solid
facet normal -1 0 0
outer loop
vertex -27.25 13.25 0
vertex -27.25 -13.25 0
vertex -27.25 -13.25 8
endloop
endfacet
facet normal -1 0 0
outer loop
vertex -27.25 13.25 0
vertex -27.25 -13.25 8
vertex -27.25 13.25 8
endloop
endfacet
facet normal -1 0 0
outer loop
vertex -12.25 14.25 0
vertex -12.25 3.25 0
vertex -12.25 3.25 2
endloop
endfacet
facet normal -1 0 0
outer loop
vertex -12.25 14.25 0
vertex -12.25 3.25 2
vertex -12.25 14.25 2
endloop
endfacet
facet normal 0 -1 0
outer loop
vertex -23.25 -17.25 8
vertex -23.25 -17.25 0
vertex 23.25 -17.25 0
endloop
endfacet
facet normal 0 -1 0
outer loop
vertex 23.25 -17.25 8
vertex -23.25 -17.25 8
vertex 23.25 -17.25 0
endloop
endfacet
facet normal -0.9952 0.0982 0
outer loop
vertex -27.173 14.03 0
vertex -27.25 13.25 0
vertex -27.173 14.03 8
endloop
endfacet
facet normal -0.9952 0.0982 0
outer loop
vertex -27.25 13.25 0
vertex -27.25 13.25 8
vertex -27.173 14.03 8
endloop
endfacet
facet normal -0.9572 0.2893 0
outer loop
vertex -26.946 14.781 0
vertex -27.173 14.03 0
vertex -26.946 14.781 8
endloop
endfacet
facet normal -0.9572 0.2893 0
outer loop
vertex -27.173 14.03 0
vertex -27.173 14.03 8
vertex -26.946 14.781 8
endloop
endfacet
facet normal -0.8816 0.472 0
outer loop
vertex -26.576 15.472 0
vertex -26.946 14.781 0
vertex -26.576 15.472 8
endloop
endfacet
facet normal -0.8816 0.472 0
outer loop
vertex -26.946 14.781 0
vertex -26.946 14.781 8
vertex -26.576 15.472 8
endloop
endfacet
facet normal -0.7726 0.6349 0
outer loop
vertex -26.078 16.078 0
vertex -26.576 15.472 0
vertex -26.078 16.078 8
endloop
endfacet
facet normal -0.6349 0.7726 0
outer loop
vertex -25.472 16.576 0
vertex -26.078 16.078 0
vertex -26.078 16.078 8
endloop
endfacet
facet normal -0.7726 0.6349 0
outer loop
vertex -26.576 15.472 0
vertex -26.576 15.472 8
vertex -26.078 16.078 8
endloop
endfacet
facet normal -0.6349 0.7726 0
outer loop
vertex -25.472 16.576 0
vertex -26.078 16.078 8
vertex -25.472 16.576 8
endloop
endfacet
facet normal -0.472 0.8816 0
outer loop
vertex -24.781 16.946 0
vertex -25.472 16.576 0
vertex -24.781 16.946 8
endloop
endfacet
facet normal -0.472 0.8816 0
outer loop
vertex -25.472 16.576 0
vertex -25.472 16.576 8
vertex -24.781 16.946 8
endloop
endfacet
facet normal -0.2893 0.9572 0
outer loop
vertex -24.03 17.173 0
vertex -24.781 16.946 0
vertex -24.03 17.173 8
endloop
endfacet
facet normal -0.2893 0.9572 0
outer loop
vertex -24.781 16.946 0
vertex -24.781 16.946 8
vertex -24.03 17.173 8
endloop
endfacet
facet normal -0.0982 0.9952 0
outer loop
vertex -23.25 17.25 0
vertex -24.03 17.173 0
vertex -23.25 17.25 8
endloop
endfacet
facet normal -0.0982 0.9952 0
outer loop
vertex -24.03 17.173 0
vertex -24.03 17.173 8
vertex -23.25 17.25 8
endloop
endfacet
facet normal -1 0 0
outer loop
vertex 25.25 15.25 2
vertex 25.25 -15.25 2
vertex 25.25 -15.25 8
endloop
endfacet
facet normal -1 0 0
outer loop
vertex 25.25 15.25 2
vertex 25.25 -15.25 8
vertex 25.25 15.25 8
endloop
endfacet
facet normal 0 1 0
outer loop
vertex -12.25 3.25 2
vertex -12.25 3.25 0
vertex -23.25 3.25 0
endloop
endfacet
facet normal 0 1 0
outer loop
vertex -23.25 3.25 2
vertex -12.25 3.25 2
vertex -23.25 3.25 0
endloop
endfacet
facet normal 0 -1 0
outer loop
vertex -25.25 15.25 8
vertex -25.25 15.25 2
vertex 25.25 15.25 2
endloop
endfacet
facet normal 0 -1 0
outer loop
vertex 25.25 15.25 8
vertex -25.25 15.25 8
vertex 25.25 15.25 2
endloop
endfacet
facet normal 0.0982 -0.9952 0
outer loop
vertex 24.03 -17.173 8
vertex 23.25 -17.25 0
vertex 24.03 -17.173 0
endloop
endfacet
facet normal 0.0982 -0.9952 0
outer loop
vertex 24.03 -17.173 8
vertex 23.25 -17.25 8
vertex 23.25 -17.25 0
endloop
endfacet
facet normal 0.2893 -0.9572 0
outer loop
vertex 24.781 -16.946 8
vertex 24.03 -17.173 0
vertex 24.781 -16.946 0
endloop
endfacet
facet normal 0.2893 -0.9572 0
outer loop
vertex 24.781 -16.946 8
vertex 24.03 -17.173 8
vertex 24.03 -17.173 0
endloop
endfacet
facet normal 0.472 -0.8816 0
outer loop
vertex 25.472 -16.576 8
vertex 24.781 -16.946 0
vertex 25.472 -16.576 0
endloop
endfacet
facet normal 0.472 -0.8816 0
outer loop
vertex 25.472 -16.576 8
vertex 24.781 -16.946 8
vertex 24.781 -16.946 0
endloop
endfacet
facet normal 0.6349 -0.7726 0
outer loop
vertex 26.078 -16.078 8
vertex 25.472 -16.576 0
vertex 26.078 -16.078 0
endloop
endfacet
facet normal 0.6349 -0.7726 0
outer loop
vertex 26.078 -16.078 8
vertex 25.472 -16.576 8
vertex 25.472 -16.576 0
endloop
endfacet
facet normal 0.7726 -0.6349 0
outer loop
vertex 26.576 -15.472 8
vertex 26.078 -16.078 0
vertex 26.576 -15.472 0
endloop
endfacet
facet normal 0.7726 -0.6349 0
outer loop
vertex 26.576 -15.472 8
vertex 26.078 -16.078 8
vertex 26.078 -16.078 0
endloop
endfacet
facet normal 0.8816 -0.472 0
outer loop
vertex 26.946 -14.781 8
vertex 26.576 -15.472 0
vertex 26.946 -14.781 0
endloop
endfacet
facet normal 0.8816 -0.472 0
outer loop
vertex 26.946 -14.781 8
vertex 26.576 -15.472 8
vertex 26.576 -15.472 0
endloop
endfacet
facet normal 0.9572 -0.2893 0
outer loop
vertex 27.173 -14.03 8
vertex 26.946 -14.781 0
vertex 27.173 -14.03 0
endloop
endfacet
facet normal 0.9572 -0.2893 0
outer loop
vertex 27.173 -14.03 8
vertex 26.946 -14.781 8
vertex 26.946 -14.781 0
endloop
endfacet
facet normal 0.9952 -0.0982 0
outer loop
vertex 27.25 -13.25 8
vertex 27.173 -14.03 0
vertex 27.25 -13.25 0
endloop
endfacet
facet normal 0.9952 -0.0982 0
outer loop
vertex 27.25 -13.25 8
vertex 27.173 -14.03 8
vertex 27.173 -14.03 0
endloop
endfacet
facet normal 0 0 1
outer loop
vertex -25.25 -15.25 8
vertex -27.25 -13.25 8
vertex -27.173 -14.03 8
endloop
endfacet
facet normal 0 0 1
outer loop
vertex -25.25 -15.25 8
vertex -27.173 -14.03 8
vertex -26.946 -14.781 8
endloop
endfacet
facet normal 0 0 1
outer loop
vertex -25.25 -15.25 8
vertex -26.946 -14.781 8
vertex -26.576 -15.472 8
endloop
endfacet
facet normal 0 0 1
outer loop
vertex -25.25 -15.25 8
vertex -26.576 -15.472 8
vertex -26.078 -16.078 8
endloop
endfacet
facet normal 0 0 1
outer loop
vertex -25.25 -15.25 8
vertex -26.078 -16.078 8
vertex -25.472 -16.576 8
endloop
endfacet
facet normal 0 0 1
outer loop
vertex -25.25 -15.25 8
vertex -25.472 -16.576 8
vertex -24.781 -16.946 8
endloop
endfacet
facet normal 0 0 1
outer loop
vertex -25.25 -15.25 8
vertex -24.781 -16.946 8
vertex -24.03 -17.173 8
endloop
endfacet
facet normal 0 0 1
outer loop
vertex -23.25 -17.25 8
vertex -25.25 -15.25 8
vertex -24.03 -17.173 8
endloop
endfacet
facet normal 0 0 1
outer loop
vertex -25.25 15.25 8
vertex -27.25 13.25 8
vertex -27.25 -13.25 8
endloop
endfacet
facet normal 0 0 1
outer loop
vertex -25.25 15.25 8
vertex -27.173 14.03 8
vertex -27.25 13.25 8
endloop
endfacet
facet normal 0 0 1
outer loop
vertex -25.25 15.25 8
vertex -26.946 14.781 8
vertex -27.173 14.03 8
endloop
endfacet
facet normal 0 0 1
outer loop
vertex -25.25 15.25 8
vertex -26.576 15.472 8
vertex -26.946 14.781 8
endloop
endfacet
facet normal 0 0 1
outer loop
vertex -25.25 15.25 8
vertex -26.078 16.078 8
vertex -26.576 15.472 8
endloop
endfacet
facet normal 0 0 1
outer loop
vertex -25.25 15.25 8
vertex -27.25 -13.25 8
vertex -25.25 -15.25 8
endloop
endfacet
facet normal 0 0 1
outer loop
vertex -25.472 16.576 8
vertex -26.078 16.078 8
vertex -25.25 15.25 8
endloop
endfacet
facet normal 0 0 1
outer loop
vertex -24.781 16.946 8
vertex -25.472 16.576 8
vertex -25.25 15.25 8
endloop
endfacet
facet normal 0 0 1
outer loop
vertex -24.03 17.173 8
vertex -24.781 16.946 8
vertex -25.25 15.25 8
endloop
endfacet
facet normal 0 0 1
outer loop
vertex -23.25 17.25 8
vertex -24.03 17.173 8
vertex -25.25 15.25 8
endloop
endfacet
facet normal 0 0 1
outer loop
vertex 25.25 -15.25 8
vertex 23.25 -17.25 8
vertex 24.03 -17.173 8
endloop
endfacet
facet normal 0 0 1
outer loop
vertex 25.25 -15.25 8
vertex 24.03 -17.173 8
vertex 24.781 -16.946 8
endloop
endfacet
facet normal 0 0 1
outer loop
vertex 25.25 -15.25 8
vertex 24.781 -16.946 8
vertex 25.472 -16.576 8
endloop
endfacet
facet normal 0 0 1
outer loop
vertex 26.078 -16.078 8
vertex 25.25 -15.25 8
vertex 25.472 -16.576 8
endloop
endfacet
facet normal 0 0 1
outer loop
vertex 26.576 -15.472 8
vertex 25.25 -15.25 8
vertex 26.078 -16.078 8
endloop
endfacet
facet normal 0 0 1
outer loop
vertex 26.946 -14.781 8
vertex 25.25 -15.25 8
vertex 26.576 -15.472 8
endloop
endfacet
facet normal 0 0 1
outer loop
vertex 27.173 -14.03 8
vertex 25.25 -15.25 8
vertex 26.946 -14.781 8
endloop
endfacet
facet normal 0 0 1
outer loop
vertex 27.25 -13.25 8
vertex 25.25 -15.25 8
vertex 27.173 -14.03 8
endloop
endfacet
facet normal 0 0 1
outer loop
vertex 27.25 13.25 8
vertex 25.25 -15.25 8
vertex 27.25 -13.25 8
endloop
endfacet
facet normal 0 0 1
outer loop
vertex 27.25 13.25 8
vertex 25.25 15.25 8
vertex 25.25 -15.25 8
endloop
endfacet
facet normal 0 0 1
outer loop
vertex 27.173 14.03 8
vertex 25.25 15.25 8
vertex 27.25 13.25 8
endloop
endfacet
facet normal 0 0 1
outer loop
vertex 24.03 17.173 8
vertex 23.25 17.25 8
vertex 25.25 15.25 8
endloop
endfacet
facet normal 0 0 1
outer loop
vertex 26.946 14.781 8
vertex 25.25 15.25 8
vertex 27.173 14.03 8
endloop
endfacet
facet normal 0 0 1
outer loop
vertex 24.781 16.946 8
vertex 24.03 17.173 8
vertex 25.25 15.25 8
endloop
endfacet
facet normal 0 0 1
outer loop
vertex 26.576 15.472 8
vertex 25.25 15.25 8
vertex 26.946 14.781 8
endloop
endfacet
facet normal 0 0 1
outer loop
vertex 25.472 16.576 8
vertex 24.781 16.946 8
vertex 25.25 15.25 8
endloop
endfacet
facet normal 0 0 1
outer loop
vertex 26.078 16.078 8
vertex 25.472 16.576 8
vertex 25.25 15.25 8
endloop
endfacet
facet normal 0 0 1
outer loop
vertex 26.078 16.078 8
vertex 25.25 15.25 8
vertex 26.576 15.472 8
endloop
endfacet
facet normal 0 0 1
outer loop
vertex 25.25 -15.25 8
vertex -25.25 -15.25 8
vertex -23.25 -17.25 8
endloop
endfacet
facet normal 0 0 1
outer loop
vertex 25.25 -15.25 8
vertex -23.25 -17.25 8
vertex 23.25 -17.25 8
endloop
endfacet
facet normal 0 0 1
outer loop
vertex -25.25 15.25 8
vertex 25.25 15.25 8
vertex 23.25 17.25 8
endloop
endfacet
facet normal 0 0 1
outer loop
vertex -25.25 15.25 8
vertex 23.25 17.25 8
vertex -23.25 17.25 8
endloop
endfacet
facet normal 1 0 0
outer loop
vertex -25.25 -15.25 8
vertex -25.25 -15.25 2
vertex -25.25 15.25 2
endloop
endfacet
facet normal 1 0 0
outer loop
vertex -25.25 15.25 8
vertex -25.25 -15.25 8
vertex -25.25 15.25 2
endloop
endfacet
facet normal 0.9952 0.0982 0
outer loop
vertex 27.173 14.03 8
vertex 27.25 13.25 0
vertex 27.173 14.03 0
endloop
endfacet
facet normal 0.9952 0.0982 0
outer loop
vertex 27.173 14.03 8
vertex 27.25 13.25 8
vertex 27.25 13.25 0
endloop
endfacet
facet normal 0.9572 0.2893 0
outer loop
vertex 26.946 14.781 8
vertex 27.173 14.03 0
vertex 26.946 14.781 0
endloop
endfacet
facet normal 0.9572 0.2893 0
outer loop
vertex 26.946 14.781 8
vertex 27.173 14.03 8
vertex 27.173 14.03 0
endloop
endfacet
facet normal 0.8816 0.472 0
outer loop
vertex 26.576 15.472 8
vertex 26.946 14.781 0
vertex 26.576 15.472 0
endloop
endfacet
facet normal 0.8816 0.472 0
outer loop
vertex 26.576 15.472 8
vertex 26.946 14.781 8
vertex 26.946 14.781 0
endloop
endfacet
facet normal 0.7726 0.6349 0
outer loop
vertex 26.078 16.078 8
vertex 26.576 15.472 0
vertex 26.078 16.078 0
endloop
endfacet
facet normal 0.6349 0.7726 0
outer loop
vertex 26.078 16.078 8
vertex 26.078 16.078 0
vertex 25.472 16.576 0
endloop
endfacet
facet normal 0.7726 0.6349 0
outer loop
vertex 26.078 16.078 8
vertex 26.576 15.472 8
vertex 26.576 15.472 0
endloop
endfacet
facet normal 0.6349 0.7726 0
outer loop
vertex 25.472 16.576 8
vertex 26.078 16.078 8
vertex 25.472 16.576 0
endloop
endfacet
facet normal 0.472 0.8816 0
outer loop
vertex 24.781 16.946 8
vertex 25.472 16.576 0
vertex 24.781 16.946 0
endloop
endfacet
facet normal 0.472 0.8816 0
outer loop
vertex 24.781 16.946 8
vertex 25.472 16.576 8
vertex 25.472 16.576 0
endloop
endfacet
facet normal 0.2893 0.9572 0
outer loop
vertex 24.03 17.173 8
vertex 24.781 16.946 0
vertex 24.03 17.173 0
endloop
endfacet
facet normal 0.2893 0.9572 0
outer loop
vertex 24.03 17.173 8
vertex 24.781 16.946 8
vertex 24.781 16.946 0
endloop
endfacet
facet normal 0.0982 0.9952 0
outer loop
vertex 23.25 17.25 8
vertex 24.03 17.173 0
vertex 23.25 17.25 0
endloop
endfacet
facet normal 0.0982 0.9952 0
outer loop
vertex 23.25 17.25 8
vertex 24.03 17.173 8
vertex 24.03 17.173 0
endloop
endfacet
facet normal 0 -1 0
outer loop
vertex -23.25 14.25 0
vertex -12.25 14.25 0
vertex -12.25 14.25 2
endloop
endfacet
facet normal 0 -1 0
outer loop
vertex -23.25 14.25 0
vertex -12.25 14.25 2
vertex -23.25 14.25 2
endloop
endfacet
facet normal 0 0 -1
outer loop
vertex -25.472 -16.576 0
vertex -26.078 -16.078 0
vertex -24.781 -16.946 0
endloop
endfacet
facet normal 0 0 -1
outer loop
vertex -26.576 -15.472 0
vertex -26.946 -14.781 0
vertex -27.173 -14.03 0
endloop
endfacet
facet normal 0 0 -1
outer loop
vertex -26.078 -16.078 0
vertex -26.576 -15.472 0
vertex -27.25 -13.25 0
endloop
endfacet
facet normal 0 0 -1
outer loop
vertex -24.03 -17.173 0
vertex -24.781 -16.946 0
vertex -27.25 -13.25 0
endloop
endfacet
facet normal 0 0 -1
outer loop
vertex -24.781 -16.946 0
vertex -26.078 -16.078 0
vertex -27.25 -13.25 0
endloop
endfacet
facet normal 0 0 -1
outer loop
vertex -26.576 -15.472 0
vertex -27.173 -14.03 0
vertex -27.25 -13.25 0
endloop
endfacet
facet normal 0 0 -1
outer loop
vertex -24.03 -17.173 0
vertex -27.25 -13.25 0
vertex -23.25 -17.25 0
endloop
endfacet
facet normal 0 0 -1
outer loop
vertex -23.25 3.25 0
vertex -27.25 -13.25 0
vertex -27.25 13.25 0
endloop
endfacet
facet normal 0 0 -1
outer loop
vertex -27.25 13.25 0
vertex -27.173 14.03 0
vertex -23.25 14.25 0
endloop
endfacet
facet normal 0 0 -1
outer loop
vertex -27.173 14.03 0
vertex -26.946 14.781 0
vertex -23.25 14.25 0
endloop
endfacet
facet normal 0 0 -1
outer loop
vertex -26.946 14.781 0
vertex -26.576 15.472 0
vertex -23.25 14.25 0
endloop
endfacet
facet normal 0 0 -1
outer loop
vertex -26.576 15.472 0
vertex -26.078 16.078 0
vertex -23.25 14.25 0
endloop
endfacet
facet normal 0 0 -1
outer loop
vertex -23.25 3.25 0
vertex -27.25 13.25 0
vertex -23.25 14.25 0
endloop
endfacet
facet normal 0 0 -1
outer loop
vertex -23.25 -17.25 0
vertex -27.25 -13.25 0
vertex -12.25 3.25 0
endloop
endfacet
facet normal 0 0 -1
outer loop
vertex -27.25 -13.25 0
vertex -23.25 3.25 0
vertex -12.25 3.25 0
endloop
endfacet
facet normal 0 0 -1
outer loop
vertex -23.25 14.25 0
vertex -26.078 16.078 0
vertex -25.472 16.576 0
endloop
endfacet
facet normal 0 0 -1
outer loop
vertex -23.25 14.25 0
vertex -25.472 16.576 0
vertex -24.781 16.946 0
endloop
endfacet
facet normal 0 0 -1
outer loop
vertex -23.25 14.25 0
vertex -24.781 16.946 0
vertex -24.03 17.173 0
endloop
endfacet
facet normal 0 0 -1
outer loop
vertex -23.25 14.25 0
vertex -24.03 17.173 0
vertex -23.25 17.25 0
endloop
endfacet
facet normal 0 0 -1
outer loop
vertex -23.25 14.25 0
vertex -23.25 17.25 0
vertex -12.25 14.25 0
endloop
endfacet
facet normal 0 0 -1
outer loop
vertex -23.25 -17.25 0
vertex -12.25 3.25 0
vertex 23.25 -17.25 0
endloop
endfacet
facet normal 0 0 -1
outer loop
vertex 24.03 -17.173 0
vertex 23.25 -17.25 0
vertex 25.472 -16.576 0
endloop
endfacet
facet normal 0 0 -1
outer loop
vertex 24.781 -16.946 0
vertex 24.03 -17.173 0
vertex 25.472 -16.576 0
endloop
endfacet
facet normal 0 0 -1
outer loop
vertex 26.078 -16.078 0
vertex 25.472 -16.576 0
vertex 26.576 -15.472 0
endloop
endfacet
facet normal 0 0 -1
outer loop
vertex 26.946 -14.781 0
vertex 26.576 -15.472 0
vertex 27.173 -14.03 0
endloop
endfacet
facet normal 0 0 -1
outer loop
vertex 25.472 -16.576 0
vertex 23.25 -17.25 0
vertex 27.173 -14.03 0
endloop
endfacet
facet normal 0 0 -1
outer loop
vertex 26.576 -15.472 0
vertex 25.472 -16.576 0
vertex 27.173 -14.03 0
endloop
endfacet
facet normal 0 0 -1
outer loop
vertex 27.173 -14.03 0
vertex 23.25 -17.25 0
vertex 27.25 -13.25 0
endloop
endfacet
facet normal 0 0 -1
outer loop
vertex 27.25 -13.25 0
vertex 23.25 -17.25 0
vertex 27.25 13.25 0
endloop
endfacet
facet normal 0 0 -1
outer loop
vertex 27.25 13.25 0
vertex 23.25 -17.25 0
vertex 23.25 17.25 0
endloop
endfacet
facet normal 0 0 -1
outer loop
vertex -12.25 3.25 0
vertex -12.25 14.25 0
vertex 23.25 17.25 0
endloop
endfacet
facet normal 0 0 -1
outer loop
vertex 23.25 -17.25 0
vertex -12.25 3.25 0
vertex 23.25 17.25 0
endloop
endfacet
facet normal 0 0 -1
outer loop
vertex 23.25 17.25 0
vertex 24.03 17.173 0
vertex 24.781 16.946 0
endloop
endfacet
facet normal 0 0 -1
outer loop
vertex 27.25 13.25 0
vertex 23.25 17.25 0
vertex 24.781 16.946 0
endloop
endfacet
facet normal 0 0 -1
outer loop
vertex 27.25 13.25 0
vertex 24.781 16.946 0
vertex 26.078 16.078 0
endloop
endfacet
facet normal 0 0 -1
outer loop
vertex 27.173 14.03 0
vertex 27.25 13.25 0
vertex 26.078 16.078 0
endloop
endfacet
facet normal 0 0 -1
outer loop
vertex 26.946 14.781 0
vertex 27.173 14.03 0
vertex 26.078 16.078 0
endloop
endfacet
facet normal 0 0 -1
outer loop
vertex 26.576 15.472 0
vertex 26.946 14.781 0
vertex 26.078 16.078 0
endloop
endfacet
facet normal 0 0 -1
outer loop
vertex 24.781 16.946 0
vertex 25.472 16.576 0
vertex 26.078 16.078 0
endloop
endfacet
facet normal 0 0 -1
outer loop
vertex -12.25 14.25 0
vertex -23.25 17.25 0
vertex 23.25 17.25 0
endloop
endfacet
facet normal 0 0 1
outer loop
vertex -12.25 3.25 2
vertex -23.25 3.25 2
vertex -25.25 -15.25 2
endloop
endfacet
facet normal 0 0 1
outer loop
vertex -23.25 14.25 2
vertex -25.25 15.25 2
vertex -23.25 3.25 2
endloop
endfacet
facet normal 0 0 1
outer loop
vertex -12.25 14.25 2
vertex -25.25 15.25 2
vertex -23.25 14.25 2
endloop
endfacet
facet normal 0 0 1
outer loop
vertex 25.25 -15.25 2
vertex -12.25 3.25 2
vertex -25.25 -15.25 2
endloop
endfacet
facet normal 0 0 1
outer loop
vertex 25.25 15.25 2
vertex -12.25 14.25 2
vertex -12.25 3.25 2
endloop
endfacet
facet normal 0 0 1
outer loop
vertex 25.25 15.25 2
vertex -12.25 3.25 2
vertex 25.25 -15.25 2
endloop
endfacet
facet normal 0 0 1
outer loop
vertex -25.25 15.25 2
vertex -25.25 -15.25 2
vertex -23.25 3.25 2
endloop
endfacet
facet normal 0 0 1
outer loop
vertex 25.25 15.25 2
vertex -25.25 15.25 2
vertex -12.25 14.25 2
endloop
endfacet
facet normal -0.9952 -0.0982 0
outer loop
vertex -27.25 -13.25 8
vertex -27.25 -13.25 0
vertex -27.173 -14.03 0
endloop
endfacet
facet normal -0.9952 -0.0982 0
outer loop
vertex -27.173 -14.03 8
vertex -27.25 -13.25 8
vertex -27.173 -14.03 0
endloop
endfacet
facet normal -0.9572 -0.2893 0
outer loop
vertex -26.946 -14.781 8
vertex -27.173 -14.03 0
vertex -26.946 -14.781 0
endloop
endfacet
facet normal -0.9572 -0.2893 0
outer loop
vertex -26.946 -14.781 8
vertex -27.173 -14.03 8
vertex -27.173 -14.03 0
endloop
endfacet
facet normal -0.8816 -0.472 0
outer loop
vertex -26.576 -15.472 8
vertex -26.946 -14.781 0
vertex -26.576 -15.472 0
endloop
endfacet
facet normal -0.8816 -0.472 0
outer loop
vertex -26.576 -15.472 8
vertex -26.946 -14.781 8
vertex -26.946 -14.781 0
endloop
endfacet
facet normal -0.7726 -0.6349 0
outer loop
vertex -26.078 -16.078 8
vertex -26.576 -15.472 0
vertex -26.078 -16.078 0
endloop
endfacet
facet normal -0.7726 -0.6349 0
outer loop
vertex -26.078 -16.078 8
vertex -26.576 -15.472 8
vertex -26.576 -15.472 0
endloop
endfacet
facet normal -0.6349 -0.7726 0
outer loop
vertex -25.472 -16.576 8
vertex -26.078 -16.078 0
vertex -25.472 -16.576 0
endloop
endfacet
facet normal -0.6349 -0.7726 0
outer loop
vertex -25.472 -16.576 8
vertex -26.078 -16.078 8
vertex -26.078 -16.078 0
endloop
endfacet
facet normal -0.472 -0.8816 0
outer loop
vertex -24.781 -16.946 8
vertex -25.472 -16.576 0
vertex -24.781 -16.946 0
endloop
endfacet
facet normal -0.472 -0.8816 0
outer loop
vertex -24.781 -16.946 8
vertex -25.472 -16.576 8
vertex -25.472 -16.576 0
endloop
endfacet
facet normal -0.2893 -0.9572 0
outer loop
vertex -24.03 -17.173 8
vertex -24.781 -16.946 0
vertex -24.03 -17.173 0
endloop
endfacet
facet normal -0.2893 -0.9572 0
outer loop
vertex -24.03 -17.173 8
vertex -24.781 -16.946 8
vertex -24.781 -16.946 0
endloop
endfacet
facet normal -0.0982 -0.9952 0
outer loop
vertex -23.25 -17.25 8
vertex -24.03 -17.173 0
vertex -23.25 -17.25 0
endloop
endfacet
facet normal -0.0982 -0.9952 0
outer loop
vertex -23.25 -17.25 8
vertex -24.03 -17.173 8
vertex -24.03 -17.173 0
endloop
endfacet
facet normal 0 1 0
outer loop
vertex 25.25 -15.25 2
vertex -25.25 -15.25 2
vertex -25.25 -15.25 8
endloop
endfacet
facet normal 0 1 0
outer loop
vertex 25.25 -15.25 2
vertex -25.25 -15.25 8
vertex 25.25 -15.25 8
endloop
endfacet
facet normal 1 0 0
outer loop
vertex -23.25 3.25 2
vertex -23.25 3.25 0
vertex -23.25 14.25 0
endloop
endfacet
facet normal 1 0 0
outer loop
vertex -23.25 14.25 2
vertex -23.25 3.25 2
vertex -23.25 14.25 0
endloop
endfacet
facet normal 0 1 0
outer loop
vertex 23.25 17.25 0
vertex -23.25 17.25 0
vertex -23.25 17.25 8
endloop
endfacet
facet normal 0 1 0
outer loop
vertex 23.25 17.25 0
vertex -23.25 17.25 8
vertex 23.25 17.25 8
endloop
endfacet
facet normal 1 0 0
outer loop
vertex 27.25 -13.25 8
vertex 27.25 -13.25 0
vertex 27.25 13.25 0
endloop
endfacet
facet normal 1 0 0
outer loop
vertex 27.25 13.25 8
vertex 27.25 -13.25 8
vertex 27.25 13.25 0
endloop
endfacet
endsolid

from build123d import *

# Parameters (mm, degrees)
SKETCH2_W           = 54.5
SKETCH2_H           = 34.5
BOSS_EXTRUDE1_DEPTH = 8
SHELL1_T            = -2
FILLET2_R           = 4
SKETCH3_W           = 11
SKETCH3_H           = 11
CUT_EXTRUDE1_DEPTH  = 26


with BuildPart() as part:
    # Sketch2 → Boss-Extrude1 (new body)
    with BuildSketch(Plane.XY):
        Rectangle(SKETCH2_W, SKETCH2_H)
    extrude(amount=BOSS_EXTRUDE1_DEPTH)

    # Shell1
    shell1_openings = [part.faces().sort_by_distance(p)[0] for p in [
        (0, 0, 8),
    ]]
    offset(amount=SHELL1_T, openings=shell1_openings, kind=Kind.INTERSECTION)

    # Fillet2
    fillet2_edges = [part.edges().sort_by_distance(p)[0] for p in [
        (27.25, -17.25, 4),
        (-27.25, -17.25, 4),
        (-27.25, 17.25, 4),
        (27.25, 17.25, 4),
    ]]
    fillet(fillet2_edges, radius=FILLET2_R)

    # Sketch3 → Cut-Extrude1 (cut)
    with BuildSketch(Plane(origin=(0, 0, -10), x_dir=(-1, 0, 0), z_dir=(0, 0, -1))):
        with Locations((17.75, 8.75)):
            Rectangle(SKETCH3_W, SKETCH3_H)
    extrude(amount=-CUT_EXTRUDE1_DEPTH, mode=Mode.SUBTRACT)


solid = part.part
